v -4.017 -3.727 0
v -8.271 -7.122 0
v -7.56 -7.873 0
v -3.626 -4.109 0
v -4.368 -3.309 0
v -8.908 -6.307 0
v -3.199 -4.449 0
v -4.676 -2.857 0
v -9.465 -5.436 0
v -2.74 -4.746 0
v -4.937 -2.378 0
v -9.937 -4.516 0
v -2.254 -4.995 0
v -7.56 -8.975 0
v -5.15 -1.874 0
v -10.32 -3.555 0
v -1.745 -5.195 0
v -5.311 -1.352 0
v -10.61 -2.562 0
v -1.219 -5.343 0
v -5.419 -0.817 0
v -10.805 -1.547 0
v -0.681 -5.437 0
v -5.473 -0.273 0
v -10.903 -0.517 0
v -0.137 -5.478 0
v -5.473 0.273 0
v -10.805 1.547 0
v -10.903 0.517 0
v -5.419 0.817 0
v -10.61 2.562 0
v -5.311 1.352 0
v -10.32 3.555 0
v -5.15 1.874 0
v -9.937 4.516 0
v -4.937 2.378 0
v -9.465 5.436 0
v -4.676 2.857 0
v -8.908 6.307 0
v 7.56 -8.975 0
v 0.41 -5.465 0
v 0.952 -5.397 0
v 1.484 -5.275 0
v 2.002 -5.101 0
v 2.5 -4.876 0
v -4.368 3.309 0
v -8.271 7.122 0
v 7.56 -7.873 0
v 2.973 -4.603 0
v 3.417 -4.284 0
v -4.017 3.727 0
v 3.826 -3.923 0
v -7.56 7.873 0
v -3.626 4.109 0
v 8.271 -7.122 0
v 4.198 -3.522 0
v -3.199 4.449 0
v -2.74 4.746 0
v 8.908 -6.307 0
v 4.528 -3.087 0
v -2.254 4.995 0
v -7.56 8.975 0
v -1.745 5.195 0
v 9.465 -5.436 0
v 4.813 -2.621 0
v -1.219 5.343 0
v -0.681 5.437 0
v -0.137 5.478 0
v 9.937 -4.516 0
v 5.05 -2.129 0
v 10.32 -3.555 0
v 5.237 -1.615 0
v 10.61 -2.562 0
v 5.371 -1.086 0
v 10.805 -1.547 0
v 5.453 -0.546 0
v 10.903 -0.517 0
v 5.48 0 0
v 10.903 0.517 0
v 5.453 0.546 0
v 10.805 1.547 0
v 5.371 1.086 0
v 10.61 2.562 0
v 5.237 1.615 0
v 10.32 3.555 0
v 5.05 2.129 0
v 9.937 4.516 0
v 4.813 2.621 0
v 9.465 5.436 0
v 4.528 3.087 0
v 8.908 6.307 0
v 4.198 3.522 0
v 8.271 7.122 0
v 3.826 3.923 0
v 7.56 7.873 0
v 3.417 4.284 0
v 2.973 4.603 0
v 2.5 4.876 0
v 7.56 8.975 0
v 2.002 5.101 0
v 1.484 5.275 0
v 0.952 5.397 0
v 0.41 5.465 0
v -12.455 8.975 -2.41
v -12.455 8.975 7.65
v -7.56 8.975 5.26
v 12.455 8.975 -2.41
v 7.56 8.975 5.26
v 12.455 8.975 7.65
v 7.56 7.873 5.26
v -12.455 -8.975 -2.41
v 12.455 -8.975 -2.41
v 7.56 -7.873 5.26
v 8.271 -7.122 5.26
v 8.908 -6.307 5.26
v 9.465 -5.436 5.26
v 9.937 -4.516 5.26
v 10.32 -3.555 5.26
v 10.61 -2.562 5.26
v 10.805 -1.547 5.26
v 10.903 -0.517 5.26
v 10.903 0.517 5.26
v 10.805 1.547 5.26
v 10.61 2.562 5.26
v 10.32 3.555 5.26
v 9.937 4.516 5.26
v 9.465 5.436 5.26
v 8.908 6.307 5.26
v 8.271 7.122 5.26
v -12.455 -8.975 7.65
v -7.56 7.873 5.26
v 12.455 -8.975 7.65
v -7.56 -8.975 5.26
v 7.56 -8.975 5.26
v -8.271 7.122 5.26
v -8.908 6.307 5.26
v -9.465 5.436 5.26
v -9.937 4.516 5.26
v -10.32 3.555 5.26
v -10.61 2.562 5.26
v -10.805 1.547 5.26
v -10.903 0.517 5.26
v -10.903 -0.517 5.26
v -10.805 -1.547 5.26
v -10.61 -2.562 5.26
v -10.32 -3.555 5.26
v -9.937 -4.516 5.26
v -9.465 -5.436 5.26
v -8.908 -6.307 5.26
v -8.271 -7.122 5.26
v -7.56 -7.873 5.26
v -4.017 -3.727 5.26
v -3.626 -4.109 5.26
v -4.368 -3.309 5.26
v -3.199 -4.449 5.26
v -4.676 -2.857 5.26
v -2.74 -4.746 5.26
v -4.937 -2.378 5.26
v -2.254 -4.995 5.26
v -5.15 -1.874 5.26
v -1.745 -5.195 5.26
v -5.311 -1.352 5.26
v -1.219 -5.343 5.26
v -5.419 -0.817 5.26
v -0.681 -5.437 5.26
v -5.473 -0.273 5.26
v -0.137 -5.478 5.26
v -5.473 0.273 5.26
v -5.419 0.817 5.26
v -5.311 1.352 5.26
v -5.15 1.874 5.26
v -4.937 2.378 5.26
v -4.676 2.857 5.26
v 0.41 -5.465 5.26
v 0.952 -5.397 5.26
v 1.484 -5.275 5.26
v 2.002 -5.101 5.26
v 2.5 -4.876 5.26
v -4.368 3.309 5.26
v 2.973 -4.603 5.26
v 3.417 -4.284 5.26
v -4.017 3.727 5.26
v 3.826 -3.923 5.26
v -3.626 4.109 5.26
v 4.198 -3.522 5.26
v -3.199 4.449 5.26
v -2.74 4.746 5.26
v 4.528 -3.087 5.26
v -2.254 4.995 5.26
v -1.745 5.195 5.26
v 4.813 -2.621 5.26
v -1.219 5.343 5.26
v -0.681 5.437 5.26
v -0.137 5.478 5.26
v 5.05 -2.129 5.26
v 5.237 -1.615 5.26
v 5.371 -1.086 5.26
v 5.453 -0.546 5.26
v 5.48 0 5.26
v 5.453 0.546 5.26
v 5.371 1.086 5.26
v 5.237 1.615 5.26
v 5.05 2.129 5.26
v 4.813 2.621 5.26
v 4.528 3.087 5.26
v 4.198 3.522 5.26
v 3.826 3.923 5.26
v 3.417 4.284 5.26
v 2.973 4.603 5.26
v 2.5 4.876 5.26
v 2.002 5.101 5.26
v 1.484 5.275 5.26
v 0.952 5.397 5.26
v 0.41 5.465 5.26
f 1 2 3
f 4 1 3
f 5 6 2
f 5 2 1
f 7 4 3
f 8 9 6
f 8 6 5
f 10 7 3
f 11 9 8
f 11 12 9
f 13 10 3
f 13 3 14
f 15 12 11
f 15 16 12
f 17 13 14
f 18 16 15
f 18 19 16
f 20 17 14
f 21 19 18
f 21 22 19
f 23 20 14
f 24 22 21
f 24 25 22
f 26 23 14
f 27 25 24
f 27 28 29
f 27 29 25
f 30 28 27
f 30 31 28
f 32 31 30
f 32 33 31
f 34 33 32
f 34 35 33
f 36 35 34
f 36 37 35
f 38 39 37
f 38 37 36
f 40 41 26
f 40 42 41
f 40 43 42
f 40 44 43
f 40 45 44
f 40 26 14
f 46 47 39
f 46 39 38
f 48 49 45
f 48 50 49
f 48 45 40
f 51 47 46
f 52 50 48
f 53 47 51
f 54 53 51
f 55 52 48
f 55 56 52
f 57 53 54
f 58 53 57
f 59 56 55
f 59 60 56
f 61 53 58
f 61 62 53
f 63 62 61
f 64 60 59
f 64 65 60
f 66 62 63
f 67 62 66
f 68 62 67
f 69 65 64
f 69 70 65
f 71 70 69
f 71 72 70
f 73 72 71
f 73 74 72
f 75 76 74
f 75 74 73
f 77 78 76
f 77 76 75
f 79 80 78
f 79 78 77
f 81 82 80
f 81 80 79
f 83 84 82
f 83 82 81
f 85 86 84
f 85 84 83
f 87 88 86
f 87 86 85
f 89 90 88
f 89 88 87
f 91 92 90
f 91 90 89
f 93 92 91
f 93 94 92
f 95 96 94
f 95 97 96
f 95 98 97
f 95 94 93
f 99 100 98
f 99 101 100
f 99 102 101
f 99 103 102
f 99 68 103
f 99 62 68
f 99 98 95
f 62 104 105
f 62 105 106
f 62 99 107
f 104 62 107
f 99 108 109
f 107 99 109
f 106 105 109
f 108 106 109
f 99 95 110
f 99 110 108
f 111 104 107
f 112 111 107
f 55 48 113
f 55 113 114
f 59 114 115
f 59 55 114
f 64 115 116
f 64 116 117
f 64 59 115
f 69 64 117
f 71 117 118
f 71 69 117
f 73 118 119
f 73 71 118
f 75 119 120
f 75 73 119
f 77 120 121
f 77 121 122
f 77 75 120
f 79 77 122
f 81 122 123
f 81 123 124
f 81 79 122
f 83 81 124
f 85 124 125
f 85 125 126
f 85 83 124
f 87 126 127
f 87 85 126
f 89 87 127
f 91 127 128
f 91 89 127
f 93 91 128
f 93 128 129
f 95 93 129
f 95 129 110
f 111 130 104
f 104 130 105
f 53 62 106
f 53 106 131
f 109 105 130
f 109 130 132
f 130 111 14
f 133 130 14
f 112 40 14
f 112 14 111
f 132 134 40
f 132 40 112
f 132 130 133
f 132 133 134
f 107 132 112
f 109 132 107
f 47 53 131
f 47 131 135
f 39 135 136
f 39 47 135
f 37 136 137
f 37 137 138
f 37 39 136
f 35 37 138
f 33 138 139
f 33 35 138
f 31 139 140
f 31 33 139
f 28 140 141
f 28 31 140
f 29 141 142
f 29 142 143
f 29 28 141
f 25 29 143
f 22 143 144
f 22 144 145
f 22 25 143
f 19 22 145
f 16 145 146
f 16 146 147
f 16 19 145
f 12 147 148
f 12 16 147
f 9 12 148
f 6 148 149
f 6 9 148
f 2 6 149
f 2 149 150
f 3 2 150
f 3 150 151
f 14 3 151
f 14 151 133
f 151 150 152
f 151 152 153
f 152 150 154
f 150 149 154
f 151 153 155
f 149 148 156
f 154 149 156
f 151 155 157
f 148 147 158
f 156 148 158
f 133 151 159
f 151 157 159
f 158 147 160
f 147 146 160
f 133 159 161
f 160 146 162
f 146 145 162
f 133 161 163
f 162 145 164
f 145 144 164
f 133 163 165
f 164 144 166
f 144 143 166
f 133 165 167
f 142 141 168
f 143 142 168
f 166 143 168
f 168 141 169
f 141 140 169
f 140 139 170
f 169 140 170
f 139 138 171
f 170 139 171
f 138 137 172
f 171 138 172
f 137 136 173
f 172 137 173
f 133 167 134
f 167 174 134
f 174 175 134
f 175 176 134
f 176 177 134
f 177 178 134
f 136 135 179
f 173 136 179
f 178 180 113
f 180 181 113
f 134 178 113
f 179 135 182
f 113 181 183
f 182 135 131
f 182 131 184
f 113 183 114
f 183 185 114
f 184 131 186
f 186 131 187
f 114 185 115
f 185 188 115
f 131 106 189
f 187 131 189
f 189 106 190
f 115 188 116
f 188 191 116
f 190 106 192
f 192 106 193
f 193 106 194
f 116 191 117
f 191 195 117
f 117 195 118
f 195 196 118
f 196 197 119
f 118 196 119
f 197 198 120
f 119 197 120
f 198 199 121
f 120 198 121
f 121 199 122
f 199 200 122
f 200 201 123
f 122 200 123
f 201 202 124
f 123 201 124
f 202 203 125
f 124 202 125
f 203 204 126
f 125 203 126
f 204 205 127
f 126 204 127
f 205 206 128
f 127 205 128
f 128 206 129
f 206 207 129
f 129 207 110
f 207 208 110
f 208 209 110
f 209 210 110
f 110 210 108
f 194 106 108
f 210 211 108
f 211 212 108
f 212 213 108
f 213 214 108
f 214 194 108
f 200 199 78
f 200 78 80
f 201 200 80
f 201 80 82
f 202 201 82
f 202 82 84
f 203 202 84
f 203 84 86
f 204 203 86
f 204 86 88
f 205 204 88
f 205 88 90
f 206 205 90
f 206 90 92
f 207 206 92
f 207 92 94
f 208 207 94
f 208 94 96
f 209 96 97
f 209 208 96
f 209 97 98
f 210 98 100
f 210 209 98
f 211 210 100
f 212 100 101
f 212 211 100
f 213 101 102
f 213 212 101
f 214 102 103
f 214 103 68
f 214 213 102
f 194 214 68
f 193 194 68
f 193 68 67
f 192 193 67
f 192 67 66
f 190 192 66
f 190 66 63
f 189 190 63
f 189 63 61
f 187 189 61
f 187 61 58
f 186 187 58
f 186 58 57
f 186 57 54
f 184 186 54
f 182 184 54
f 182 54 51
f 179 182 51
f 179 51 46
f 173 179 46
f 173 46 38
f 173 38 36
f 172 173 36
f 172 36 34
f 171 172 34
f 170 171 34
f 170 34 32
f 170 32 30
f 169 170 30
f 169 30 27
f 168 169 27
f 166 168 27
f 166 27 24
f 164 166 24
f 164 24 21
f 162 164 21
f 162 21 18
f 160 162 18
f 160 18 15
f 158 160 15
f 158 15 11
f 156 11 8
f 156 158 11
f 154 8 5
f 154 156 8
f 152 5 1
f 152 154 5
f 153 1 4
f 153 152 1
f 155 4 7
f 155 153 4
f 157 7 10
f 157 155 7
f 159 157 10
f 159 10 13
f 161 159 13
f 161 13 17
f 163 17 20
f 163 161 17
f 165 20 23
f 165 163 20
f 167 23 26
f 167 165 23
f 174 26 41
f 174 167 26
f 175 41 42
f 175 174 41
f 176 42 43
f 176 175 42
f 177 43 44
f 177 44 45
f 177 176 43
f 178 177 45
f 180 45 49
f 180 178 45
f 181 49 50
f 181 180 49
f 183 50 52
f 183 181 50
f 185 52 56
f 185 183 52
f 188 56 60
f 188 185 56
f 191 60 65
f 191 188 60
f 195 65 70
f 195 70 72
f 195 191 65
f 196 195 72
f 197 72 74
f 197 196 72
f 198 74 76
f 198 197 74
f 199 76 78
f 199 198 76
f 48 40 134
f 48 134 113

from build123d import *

# Parameters (mm, degrees)
SKETCH_1_W          = 24.91
SKETCH_1_H          = 17.95
EXTRUDE_1_DEPTH     = 7.65
CUT_EXTRUDE_1_DEPTH = 5.26
SKETCH_3_R          = 5.48
EXTRUDE_2_DEPTH     = 7.65
SKETCH_4_W          = 24.91
SKETCH_4_H          = 17.95
EXTRUDE_3_DEPTH     = 2.41


with BuildPart() as part:
    # 草图1 → 凸台-拉伸1 (new body)
    with BuildSketch(Plane.XY):
        Rectangle(SKETCH_1_W, SKETCH_1_H)
    extrude(amount=EXTRUDE_1_DEPTH)

    # 草图2 → 切除-拉伸1 (cut)
    with BuildSketch(Plane(origin=(0, 0, 0), x_dir=(-1, 0, 0), z_dir=(0, 0, -1))):
        with BuildLine():
            Line((-7.56, -8.975), (-7.56, -7.872967992))
            ThreePointArc((-7.56, -7.872967992), (-10.915, 0), (-7.56, 7.872967992))
            Line((-7.56, 7.872967992), (-7.56, 8.975))
            Line((-7.56, 8.975), (7.56, 8.975))
            Line((7.56, 8.975), (7.56, 7.872967992))
            ThreePointArc((7.56, 7.872967992), (10.915, 0), (7.56, -7.872967992))
            Line((7.56, -7.872967992), (7.56, -8.975))
            Line((7.56, -8.975), (-7.56, -8.975))
        make_face()
    extrude(amount=-CUT_EXTRUDE_1_DEPTH, mode=Mode.SUBTRACT)

    # 草图3 → 凸台-拉伸2 (add)
    with BuildSketch(Plane.XY.offset(7.65)):
        Circle(SKETCH_3_R)
    extrude(amount=-EXTRUDE_2_DEPTH)

    # 草图4 → 凸台-拉伸3 (add)
    with BuildSketch(Plane.XY):
        Rectangle(SKETCH_4_W, SKETCH_4_H)
    extrude(amount=-EXTRUDE_3_DEPTH)


solid = part.part
